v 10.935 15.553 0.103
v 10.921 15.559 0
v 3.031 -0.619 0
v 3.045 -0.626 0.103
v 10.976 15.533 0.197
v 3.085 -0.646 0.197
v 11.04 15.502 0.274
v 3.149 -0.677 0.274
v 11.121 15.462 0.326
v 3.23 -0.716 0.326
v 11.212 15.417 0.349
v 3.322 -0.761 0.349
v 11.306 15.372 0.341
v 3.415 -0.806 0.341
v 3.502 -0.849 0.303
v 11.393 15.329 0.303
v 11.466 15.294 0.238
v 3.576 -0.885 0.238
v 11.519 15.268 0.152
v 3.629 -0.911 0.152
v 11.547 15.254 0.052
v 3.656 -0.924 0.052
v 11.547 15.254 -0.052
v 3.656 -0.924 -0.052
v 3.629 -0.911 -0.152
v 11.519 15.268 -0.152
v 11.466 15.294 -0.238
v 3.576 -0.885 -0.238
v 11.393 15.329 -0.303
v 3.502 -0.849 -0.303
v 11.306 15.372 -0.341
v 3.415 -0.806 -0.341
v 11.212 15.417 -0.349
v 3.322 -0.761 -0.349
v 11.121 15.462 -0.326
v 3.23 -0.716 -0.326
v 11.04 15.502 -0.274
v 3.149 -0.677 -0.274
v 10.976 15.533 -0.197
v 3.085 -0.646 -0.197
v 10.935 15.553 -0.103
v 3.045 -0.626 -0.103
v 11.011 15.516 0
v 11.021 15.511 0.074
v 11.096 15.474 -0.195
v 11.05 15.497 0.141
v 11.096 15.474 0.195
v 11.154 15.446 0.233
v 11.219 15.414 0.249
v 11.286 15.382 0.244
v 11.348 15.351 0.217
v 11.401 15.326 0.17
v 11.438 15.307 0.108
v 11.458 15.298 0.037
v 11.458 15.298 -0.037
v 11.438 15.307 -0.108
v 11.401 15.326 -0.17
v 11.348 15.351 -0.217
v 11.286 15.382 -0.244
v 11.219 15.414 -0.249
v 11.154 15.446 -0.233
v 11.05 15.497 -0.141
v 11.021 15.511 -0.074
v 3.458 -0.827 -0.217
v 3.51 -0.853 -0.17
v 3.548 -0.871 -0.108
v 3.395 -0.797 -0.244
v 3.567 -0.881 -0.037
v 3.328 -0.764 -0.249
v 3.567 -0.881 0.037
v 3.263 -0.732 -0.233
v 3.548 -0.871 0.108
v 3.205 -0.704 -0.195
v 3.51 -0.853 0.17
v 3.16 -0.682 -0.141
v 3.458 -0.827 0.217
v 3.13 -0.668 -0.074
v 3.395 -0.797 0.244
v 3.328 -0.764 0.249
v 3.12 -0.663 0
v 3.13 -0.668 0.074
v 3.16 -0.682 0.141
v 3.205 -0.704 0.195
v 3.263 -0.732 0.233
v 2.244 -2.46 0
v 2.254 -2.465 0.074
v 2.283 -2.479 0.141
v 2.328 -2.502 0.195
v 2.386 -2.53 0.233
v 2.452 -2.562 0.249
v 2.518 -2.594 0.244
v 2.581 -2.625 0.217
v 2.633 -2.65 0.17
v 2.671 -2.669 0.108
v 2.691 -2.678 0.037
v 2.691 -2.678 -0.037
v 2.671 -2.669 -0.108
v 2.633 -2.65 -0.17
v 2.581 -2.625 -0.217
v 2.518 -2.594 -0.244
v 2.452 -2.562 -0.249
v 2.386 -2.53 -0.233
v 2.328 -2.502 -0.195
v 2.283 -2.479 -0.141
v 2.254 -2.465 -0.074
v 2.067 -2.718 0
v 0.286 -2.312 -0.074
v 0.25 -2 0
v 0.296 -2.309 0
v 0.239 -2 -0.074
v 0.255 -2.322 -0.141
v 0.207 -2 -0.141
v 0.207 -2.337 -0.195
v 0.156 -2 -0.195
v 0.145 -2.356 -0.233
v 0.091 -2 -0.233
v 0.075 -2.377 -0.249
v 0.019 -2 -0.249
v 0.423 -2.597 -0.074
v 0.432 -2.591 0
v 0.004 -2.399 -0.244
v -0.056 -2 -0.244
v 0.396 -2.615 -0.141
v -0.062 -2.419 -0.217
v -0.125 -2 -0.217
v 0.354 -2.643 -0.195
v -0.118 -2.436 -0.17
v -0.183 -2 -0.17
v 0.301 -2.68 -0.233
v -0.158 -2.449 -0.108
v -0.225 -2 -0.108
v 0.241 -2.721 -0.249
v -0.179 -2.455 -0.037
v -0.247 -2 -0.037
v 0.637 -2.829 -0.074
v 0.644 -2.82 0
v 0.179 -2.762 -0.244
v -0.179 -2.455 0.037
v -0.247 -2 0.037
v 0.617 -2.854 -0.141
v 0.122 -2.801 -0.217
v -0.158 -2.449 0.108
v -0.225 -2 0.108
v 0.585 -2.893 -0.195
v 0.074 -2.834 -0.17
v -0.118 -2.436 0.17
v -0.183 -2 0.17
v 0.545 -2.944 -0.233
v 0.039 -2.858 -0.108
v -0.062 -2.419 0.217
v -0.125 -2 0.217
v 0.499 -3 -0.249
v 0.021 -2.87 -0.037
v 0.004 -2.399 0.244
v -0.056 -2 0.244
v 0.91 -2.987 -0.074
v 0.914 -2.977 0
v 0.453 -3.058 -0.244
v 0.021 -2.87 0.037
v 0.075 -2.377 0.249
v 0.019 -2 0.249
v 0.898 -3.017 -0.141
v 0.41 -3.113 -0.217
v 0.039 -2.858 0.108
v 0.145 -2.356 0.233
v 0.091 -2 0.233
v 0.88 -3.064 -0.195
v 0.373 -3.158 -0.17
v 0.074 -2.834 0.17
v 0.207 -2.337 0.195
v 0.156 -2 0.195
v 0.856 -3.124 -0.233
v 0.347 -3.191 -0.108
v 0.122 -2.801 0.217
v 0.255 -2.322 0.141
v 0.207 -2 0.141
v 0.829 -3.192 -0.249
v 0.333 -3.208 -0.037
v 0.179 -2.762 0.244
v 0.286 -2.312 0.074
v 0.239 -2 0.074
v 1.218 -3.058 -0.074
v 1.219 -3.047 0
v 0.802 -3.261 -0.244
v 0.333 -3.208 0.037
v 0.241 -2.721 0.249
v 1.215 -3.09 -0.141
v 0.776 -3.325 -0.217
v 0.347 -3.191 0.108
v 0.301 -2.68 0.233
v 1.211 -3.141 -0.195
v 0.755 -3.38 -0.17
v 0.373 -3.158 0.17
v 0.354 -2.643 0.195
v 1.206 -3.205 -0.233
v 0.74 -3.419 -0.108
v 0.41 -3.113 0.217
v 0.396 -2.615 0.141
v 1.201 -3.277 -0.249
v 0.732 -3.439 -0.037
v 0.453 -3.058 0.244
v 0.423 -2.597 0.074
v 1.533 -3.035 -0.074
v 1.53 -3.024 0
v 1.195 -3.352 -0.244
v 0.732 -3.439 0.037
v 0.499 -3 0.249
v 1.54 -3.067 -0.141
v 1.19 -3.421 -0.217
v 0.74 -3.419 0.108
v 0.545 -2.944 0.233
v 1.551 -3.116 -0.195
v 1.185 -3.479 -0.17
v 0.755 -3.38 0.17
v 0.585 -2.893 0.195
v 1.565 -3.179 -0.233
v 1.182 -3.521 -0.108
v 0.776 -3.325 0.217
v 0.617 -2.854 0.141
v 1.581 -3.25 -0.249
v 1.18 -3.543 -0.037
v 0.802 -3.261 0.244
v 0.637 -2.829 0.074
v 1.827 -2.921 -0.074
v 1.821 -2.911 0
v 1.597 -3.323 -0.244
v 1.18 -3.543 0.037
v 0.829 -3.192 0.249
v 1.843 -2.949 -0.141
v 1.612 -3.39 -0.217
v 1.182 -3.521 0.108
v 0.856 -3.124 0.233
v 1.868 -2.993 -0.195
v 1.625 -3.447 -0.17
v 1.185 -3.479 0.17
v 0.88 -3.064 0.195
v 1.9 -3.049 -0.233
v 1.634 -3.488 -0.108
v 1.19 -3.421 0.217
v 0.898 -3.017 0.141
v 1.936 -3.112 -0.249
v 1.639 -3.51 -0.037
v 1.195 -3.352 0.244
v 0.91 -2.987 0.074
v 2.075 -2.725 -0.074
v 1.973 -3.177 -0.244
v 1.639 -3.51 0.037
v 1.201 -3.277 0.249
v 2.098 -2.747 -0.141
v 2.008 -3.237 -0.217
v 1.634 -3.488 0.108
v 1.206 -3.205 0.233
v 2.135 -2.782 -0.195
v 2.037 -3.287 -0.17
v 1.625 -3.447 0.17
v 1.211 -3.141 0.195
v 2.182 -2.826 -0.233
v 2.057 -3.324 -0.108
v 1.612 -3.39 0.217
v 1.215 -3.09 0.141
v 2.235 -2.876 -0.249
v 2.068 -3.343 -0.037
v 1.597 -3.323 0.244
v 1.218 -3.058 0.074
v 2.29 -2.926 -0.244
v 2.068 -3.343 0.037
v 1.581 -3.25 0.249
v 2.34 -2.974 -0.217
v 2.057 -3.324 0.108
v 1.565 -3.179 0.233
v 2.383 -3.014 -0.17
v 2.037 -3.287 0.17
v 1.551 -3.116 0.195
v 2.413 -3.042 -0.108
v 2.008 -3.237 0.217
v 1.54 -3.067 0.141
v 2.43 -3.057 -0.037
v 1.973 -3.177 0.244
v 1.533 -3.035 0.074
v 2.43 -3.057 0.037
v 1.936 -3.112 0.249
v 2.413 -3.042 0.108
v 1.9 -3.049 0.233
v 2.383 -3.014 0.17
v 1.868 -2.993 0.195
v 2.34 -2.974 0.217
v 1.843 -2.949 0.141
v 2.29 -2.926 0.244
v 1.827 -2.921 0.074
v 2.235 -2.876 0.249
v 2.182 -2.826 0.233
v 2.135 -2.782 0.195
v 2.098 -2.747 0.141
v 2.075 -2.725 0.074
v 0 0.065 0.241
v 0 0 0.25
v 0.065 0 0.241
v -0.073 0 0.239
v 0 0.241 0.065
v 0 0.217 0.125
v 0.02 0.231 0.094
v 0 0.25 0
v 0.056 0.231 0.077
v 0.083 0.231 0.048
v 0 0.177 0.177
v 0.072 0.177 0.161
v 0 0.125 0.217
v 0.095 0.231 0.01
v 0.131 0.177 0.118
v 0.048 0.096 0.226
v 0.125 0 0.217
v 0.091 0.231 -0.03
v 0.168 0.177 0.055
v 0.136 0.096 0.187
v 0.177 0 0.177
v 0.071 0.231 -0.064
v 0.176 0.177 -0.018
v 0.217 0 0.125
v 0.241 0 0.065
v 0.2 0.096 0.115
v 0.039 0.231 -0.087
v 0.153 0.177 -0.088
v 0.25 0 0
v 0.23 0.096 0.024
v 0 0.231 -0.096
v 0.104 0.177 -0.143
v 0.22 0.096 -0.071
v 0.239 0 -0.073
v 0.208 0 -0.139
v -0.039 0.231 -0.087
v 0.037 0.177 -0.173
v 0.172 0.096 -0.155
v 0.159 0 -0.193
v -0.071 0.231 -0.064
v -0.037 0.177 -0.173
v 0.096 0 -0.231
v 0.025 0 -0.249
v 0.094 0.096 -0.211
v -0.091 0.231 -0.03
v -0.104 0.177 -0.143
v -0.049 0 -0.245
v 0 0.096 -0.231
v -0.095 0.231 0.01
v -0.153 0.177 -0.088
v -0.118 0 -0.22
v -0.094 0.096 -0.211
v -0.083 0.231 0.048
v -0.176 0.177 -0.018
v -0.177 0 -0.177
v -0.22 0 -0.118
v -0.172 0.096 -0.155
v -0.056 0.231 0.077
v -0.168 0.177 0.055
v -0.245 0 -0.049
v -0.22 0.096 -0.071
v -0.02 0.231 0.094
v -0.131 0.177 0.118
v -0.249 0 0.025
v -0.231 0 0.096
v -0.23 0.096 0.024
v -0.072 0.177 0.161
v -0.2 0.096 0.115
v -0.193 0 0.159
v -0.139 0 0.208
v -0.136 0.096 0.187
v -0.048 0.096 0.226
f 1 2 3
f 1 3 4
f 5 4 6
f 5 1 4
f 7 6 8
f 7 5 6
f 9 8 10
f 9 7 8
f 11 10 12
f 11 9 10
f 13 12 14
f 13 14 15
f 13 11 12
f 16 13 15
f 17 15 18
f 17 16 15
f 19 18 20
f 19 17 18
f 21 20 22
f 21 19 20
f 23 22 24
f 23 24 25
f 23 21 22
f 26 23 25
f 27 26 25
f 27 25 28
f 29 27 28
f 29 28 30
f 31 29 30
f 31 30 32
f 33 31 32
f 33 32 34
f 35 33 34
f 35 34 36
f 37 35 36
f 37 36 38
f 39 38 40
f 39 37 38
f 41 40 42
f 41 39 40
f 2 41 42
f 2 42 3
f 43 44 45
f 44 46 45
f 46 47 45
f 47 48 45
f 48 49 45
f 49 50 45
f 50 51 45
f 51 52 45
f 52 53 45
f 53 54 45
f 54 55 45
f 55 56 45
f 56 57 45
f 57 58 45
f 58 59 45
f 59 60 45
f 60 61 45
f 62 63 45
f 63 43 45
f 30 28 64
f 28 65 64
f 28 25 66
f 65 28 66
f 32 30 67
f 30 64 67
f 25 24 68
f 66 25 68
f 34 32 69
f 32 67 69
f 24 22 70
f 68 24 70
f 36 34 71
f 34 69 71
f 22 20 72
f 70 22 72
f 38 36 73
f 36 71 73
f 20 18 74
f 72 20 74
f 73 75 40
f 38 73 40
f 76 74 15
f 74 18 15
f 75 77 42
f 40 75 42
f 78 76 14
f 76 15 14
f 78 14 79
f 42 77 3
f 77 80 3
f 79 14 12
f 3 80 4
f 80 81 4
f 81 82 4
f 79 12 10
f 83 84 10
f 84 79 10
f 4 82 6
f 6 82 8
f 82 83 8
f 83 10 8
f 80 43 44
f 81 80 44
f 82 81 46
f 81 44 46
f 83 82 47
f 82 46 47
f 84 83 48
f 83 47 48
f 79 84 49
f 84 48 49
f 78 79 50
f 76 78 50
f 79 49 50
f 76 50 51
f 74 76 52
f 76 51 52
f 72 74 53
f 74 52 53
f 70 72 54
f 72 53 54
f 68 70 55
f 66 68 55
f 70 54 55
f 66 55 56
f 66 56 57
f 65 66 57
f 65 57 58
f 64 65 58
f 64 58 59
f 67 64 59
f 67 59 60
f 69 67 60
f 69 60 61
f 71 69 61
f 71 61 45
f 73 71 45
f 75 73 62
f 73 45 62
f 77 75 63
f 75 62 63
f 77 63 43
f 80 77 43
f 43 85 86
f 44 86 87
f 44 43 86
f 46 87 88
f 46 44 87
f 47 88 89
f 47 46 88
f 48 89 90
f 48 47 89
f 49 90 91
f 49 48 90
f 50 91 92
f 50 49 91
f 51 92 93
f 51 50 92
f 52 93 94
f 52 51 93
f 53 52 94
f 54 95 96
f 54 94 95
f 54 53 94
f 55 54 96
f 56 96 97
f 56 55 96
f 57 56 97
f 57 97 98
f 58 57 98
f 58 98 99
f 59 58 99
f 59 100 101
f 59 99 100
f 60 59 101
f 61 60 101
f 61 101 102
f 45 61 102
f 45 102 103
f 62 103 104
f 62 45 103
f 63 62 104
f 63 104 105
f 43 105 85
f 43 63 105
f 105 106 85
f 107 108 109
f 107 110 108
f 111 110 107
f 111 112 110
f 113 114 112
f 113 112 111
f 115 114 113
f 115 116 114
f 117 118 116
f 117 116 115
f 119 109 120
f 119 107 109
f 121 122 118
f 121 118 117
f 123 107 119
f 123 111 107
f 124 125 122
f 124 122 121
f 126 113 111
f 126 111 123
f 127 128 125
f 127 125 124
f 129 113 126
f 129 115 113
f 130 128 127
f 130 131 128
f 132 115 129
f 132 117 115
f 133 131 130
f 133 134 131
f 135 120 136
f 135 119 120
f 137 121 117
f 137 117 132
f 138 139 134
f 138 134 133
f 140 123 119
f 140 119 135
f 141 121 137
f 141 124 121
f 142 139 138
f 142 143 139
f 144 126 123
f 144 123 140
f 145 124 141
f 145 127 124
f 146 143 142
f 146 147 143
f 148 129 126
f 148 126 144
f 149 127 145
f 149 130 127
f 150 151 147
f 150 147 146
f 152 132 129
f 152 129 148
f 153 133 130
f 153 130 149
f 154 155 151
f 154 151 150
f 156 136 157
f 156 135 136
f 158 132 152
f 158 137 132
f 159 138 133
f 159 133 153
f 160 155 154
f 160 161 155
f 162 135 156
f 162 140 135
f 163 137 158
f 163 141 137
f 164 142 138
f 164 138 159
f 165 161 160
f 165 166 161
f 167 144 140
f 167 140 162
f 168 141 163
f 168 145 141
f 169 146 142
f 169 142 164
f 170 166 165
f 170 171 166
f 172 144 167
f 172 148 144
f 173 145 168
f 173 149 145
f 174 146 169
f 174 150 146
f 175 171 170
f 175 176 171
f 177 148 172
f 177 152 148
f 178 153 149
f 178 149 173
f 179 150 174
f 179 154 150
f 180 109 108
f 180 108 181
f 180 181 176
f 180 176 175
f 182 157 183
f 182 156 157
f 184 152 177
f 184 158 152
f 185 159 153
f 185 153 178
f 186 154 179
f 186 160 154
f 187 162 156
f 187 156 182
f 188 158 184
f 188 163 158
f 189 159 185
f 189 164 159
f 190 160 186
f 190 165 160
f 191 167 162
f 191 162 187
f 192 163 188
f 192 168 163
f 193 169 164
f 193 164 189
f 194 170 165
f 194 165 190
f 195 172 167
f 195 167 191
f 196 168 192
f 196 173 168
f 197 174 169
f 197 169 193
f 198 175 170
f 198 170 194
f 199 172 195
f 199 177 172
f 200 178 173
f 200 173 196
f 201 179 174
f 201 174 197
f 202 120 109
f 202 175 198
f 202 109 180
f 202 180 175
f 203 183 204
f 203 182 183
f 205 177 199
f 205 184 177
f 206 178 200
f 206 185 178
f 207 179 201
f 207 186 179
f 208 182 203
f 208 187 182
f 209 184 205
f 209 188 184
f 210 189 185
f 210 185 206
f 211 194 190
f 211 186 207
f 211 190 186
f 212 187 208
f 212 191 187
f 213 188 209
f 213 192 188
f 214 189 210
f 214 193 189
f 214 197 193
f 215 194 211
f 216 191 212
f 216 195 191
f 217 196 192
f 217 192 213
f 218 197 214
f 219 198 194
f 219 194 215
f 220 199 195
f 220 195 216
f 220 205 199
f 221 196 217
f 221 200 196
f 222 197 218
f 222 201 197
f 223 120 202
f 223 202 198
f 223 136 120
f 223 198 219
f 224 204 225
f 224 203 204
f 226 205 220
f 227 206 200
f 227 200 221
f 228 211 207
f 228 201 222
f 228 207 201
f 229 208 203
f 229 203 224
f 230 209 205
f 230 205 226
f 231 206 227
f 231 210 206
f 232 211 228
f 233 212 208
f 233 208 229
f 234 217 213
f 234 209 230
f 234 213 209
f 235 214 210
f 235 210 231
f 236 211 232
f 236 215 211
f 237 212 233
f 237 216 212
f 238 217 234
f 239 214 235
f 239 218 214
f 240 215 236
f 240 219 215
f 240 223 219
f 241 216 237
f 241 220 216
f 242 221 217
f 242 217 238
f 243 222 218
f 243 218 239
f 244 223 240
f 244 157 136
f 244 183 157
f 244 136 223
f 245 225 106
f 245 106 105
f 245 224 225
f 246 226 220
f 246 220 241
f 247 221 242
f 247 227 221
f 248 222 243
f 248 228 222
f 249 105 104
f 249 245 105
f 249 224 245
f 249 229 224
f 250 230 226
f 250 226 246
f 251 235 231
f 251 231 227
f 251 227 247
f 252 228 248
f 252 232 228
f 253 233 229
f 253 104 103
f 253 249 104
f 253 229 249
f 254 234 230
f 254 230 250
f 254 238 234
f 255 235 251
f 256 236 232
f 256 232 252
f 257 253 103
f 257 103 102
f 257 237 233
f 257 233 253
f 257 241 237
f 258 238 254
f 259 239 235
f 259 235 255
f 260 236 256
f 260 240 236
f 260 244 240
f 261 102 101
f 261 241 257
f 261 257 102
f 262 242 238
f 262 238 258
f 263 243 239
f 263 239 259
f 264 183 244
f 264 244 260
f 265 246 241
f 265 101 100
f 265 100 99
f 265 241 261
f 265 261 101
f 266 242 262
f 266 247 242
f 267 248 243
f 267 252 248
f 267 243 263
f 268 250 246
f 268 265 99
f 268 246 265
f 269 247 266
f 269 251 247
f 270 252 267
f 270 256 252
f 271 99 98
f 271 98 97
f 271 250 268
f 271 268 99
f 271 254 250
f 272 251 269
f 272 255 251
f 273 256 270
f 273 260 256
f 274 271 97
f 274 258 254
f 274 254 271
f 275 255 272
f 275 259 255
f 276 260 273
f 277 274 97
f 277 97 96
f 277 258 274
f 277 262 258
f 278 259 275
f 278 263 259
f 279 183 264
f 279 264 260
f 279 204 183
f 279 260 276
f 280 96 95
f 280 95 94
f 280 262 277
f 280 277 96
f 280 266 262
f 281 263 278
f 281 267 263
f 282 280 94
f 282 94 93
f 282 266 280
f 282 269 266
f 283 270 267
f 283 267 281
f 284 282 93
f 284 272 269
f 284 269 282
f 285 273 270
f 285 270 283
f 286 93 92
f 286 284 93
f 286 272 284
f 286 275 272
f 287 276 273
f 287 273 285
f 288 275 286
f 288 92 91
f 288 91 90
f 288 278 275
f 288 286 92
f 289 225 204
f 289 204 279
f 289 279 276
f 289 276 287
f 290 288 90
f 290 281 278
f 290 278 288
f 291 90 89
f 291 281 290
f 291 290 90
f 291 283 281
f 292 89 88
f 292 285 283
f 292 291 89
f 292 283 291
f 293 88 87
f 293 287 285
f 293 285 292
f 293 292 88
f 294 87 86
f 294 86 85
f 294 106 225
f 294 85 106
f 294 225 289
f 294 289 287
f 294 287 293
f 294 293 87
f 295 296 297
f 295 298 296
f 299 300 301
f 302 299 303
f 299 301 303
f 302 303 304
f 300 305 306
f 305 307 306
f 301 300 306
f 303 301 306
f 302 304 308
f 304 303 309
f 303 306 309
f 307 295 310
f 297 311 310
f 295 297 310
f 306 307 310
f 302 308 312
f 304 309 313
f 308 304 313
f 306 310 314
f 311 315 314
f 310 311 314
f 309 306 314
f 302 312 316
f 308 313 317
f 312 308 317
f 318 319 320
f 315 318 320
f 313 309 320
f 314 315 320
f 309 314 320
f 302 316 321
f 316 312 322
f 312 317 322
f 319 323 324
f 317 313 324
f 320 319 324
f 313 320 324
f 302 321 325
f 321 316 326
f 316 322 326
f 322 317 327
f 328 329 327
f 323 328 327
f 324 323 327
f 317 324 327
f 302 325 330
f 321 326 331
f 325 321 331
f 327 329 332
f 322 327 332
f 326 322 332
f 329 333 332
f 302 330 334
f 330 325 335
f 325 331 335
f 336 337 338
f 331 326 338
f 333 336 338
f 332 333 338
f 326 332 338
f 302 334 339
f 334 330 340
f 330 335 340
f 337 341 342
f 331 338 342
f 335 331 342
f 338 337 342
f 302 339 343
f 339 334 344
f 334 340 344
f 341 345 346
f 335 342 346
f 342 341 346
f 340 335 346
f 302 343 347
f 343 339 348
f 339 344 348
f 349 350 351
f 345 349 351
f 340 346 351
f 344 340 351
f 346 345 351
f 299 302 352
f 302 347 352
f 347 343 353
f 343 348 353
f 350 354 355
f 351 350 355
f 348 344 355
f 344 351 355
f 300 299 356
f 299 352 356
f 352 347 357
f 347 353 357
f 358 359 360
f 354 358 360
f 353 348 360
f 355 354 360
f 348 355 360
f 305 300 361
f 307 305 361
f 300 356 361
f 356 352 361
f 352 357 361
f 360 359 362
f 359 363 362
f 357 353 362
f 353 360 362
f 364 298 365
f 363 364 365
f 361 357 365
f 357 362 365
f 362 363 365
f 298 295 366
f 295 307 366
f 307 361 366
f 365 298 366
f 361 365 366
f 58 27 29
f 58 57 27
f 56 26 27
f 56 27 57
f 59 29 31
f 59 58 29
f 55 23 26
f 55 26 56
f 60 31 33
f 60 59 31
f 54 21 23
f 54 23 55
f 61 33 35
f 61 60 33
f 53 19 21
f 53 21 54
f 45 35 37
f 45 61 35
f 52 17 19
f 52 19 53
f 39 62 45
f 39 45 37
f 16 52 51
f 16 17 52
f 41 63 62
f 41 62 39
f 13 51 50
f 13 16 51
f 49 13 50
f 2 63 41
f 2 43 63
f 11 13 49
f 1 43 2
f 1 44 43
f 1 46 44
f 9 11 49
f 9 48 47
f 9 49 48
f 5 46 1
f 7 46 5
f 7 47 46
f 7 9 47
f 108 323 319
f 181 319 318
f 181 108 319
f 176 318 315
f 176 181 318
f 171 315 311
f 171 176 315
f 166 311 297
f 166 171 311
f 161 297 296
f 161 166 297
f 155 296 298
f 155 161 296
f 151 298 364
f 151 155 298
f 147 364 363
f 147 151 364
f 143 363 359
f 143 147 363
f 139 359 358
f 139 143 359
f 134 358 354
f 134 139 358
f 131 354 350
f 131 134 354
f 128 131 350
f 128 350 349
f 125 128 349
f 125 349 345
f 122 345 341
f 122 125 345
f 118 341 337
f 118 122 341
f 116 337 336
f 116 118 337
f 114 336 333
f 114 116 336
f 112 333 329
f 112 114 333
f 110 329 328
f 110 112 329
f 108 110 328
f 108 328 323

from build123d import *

# Parameters (mm, degrees)
SKETCH1_R           = 0.25
SKETCH4_R           = 0.35
SKETCH4_R_2         = 0.25
BOSS_EXTRUDE1_DEPTH = 18


with BuildPart() as part:
    # Sweep1: sweep along a path in Sketch2
    with BuildLine(Plane.XY) as sweep1_path:
        Line((0, 0), (0, -2))
        ThreePointArc((0, -2), (1.007563629, -3.266681084), (2.46843226, -2.569882491))
        Line((2.46843226, -2.569882491), (11.235855196, 15.405998435))
    # Sketch1 → Sweep1 (sweep)
    with BuildSketch(Plane(origin=(0, 0, 0), x_dir=(1, 0, 0), z_dir=(0, 1, 0))):
        Circle(SKETCH1_R)
    sweep(path=sweep1_path.line)

    # Sketch3 → Revolve1 (revolve)
    with BuildSketch(Plane(origin=(0, 0, 0), x_dir=(0, 0, -1), z_dir=(1, 0, 0))):
        with BuildLine():
            Line((0, -0.25), (0, 0.25))
            ThreePointArc((0, 0.25), (-0.25, 0), (0, -0.25))
        make_face()
    revolve(axis=Axis((0, -0.25, 0), (0, 1, 0)))


with BuildPart() as body_2:
    # Sketch4 → Boss-Extrude1 (new body)
    with BuildSketch(Plane(origin=(8.229232223, 16.872426441, 0), x_dir=(0.8987940462991698, -0.43837114678907185, 0), z_dir=(0.4383711467890718, 0.8987940462991697, 0))):
        with Locations((3.345174554, 0)):
            Circle(SKETCH4_R)
        with Locations((3.345174554, 0)):
            Circle(SKETCH4_R_2, mode=Mode.SUBTRACT)
    extrude(amount=-BOSS_EXTRUDE1_DEPTH)


solid = Compound([part.part, body_2.part])
